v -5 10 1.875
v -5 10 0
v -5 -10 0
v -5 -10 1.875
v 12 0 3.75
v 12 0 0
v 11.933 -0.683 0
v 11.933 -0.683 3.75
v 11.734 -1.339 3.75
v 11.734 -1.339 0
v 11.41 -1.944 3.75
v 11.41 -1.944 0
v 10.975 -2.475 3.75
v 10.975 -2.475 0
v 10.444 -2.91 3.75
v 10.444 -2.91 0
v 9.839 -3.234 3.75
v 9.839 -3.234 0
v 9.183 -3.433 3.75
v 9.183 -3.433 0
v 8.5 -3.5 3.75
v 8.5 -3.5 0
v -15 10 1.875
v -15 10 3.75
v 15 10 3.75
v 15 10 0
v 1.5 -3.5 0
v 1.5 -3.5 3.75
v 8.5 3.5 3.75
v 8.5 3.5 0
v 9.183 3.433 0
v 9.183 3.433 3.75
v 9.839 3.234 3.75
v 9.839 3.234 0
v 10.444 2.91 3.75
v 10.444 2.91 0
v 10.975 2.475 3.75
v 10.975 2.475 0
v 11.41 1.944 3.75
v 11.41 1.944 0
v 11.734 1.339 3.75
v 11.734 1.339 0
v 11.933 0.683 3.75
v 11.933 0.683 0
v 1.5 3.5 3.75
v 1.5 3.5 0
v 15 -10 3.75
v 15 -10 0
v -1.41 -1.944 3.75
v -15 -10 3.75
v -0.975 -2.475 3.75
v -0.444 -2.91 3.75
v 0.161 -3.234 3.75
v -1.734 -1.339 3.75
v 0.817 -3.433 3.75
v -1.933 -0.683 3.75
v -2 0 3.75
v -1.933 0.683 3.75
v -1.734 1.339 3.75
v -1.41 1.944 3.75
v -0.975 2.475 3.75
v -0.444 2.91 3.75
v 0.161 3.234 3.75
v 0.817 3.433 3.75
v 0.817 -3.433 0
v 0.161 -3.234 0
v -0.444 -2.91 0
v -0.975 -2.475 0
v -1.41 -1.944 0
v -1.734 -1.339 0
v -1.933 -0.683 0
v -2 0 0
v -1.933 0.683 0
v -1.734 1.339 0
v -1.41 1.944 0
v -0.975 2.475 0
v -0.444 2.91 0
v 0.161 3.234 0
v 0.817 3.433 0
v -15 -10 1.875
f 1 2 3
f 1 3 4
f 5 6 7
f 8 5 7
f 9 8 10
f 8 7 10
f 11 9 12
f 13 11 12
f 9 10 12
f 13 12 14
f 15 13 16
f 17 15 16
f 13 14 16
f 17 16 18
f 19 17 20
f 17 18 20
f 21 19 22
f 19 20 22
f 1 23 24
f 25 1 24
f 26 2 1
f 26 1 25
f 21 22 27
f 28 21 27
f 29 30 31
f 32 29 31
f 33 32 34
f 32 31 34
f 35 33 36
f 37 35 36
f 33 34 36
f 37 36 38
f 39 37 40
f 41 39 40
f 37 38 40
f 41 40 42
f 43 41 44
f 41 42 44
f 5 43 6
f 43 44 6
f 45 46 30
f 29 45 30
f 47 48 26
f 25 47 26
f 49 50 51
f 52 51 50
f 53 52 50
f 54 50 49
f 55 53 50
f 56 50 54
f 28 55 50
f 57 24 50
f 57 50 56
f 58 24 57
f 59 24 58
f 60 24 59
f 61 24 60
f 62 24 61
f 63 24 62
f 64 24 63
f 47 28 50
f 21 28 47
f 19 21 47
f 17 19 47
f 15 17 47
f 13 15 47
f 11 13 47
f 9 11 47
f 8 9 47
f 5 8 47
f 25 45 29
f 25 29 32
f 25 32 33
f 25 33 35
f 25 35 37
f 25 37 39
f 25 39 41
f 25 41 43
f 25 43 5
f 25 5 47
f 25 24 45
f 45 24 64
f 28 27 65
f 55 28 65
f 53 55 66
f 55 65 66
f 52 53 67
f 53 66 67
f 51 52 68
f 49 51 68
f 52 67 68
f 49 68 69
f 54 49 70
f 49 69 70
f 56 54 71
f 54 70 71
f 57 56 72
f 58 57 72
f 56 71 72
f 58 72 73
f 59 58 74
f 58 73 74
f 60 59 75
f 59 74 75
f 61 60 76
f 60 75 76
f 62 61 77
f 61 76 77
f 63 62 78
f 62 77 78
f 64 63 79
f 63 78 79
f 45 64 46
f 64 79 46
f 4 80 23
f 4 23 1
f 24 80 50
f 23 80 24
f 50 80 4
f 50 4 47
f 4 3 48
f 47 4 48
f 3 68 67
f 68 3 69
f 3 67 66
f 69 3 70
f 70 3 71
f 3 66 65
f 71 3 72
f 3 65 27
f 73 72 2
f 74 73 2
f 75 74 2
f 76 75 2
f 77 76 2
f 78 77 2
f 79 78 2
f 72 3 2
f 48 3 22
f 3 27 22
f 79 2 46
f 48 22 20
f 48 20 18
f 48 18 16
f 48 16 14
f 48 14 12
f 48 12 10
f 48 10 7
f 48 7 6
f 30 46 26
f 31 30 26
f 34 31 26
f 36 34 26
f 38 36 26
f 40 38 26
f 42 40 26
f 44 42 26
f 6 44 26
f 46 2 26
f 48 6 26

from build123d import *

# Parameters (mm, degrees)
F0_W     = 30
F0_H     = 20
F1_DEPTH = 3.75
F2_W     = 10
F2_H     = 1.875
F3_DEPTH = 24.3
F5_DEPTH = 16.12


with BuildPart() as f1:
    # F0 (on Top) → F1 (new body)
    with BuildSketch(Plane.XY):
        Rectangle(F0_W, F0_H)
    extrude(amount=F1_DEPTH)

    # F2 (on face) → F3 (cut)
    with BuildSketch(Plane.XZ.offset(10)):
        with Locations((-10, 0.9375)):
            Rectangle(F2_W, F2_H)
    extrude(amount=-F3_DEPTH, mode=Mode.SUBTRACT)

    # F4 (on face) → F5 (cut)
    with BuildSketch(Plane(origin=(0, 0, 0), x_dir=(1, 0, 0), z_dir=(0, 0, -1))):
        with BuildLine():
            ThreePointArc((1.5, -3.5), (3.974874, -2.474874), (5, 0))
            ThreePointArc((5, 0), (3.974874, 2.474874), (1.5, 3.5))
            ThreePointArc((1.5, 3.5), (-2, 0), (1.5, -3.5))
        make_face()
        with BuildLine():
            ThreePointArc((1.5, 3.5), (3.974874, 2.474874), (5, 0))
            ThreePointArc((5, 0), (6.025126, 2.474874), (8.5, 3.5))
            Line((8.5, 3.5), (1.5, 3.5))
        make_face()
        with BuildLine():
            ThreePointArc((8.5, -3.5), (6.025126, -2.474874), (5, 0))
            ThreePointArc((5, 0), (3.974874, -2.474874), (1.5, -3.5))
            Line((1.5, -3.5), (8.5, -3.5))
        make_face()
        with BuildLine():
            ThreePointArc((8.5, 3.5), (6.025126, 2.474874), (5, 0))
            ThreePointArc((5, 0), (6.025126, -2.474874), (8.5, -3.5))
            ThreePointArc((8.5, -3.5), (10.974874, -2.474874), (12, 0))
            ThreePointArc((12, 0), (10.974874, 2.474874), (8.5, 3.5))
        make_face()
    extrude(amount=-F5_DEPTH, mode=Mode.SUBTRACT)


solid = f1.part
